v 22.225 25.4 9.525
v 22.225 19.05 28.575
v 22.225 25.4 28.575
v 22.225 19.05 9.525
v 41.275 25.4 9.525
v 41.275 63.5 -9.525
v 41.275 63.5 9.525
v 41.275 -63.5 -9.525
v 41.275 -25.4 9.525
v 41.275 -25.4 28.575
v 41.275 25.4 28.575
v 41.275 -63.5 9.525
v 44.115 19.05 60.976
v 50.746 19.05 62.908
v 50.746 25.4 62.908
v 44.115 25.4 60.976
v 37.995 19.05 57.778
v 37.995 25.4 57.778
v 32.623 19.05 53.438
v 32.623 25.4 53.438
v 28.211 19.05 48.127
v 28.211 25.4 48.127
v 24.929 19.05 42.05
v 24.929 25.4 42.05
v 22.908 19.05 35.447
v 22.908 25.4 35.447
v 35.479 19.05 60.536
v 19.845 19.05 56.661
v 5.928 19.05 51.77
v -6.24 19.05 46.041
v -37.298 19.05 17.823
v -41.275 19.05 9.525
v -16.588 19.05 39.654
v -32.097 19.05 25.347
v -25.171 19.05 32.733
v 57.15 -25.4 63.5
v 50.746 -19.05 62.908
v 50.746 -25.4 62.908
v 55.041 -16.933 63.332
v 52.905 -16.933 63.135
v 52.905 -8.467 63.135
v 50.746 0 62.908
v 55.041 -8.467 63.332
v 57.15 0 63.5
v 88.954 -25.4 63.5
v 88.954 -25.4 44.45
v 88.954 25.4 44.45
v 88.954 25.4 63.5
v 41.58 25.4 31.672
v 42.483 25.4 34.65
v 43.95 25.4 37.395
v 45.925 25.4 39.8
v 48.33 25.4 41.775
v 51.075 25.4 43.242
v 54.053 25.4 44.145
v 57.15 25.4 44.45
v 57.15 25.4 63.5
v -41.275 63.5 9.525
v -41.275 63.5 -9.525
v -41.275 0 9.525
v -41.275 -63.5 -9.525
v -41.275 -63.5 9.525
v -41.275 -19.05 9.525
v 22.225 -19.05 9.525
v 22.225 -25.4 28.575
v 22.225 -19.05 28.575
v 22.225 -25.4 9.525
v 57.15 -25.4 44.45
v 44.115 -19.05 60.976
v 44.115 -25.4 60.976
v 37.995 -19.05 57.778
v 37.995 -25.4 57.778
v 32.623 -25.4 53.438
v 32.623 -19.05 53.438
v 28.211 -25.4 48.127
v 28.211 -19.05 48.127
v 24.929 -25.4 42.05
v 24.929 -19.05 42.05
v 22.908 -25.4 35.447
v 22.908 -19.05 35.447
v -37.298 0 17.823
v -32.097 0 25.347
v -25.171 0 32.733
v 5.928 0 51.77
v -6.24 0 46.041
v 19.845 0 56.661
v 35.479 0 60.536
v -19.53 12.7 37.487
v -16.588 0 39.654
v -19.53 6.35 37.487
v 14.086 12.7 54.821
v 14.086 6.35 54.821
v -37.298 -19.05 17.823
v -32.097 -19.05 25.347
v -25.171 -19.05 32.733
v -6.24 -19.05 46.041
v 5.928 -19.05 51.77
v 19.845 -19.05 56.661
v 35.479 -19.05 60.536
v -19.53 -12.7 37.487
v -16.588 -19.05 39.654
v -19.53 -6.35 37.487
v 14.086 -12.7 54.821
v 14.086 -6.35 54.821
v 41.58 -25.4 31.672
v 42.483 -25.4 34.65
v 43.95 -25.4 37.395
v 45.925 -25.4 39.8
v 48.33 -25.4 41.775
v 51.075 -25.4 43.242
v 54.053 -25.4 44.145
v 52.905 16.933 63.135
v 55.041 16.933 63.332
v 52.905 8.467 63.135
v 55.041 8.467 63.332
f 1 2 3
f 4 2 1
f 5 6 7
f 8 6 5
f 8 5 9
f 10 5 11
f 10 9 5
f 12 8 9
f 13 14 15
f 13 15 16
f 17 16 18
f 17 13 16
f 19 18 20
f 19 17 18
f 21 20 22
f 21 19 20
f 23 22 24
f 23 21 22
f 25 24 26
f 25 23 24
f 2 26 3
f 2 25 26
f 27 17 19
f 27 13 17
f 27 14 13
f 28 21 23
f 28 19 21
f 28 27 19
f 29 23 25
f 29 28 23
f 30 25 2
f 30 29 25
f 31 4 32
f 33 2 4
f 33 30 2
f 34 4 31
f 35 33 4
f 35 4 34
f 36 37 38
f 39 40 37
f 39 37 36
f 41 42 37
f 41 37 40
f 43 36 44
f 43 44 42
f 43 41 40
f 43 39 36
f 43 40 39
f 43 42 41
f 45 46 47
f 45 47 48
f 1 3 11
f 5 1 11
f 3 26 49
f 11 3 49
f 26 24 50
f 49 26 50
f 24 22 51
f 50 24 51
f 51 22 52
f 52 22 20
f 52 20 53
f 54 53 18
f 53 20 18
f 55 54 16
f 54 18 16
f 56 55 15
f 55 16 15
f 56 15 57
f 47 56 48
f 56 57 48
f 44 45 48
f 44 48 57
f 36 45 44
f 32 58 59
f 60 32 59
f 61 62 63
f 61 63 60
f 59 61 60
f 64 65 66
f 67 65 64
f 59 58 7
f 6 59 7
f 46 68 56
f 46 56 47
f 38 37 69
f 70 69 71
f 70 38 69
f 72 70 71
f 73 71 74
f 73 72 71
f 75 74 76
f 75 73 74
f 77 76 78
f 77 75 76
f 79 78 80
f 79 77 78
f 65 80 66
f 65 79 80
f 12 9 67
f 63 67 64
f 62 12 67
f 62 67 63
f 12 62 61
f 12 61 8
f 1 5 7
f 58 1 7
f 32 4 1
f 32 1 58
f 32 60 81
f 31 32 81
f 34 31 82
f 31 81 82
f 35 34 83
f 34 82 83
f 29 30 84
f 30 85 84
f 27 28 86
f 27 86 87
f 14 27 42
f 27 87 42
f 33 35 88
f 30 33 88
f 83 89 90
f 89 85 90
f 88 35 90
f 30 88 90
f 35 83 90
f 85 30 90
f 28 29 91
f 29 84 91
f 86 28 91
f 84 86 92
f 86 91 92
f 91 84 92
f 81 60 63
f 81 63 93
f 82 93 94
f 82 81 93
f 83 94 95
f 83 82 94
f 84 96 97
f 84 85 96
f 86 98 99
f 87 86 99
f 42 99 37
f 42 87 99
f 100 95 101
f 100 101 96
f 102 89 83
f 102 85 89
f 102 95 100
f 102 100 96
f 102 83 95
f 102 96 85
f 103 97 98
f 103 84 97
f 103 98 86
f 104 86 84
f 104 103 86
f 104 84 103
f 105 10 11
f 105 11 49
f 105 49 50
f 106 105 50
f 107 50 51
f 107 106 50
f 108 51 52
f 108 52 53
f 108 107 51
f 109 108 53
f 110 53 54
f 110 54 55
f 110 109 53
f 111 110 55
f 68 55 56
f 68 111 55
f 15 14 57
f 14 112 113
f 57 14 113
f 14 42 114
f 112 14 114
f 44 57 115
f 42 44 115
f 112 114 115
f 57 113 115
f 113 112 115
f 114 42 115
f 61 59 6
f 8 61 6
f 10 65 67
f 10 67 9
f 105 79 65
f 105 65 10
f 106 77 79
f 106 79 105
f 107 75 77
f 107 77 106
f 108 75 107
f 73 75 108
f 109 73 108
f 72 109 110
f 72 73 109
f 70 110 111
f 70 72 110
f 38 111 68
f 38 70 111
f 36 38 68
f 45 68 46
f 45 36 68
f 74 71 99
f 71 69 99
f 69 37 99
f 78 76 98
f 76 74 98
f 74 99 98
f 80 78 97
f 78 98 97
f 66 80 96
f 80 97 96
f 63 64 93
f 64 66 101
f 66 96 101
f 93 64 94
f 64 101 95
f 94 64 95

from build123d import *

# Parameters (mm, degrees)
F1_DEPTH = 63.5
F0_W     = 26.390754
F0_H     = 19.05
F2_DEPTH = 25.4
F3_DEPTH = 19.05


with BuildPart() as f1:
    # F0 (on Front) → F1 (new body, symmetric)
    with BuildSketch(Plane.XZ):
        Polygon((22.225, 9.525), (-41.275, 9.525), (-41.275, -9.525), (41.275, -9.525), (41.275, 9.525), align=None)
    extrude(amount=F1_DEPTH, both=True)

    # F0 (on Front) → F2 (join, symmetric)
    with BuildSketch(Plane.XZ):
        with BuildLine():
            Line((22.225, 28.575), (22.225, 9.525))
            Line((22.225, 9.525), (41.275, 9.525))
            Line((41.275, 9.525), (41.275, 28.575))
            ThreePointArc((41.275, 28.575), (45.92468, 39.80032), (57.15, 44.45))
            Line((57.15, 44.45), (62.56327, 44.45))
            Line((62.56327, 44.45), (62.56327, 63.5))
            Line((62.56327, 63.5), (57.15, 63.5))
            add(Edge.make_bspline(
                [(50.745571, 62.907767), (52.916409, 63.149474), (55.054315, 63.3464), (57.15, 63.5)],
                knots=[105.739127, 105.739127, 105.739127, 105.739127, 112.253202, 112.253202, 112.253202, 112.253202], degree=3))
            ThreePointArc((50.745571, 62.907767), (30.285243, 50.891821), (22.225, 28.575))
        make_face()
        with Locations((75.758647, 53.975)):
            Rectangle(F0_W, F0_H)
    extrude(amount=F2_DEPTH, both=True)

    # F0 (on Front) → F3 (join, symmetric)
    with BuildSketch(Plane.XZ):
        with BuildLine():
            add(Edge.make_bspline(
                [(-41.275, 9.525), (-28.407678, 43.261675), (15.507642, 58.984288), (50.745571, 62.907767)],
                knots=[0, 0, 0, 0, 105.739127, 105.739127, 105.739127, 105.739127], degree=3))
            Line((-41.275, 9.525), (22.225, 9.525))
            Line((22.225, 9.525), (22.225, 28.575))
            ThreePointArc((22.225, 28.575), (30.285243, 50.891821), (50.745571, 62.907767))
        make_face()
    extrude(amount=F3_DEPTH, both=True)


solid = f1.part
